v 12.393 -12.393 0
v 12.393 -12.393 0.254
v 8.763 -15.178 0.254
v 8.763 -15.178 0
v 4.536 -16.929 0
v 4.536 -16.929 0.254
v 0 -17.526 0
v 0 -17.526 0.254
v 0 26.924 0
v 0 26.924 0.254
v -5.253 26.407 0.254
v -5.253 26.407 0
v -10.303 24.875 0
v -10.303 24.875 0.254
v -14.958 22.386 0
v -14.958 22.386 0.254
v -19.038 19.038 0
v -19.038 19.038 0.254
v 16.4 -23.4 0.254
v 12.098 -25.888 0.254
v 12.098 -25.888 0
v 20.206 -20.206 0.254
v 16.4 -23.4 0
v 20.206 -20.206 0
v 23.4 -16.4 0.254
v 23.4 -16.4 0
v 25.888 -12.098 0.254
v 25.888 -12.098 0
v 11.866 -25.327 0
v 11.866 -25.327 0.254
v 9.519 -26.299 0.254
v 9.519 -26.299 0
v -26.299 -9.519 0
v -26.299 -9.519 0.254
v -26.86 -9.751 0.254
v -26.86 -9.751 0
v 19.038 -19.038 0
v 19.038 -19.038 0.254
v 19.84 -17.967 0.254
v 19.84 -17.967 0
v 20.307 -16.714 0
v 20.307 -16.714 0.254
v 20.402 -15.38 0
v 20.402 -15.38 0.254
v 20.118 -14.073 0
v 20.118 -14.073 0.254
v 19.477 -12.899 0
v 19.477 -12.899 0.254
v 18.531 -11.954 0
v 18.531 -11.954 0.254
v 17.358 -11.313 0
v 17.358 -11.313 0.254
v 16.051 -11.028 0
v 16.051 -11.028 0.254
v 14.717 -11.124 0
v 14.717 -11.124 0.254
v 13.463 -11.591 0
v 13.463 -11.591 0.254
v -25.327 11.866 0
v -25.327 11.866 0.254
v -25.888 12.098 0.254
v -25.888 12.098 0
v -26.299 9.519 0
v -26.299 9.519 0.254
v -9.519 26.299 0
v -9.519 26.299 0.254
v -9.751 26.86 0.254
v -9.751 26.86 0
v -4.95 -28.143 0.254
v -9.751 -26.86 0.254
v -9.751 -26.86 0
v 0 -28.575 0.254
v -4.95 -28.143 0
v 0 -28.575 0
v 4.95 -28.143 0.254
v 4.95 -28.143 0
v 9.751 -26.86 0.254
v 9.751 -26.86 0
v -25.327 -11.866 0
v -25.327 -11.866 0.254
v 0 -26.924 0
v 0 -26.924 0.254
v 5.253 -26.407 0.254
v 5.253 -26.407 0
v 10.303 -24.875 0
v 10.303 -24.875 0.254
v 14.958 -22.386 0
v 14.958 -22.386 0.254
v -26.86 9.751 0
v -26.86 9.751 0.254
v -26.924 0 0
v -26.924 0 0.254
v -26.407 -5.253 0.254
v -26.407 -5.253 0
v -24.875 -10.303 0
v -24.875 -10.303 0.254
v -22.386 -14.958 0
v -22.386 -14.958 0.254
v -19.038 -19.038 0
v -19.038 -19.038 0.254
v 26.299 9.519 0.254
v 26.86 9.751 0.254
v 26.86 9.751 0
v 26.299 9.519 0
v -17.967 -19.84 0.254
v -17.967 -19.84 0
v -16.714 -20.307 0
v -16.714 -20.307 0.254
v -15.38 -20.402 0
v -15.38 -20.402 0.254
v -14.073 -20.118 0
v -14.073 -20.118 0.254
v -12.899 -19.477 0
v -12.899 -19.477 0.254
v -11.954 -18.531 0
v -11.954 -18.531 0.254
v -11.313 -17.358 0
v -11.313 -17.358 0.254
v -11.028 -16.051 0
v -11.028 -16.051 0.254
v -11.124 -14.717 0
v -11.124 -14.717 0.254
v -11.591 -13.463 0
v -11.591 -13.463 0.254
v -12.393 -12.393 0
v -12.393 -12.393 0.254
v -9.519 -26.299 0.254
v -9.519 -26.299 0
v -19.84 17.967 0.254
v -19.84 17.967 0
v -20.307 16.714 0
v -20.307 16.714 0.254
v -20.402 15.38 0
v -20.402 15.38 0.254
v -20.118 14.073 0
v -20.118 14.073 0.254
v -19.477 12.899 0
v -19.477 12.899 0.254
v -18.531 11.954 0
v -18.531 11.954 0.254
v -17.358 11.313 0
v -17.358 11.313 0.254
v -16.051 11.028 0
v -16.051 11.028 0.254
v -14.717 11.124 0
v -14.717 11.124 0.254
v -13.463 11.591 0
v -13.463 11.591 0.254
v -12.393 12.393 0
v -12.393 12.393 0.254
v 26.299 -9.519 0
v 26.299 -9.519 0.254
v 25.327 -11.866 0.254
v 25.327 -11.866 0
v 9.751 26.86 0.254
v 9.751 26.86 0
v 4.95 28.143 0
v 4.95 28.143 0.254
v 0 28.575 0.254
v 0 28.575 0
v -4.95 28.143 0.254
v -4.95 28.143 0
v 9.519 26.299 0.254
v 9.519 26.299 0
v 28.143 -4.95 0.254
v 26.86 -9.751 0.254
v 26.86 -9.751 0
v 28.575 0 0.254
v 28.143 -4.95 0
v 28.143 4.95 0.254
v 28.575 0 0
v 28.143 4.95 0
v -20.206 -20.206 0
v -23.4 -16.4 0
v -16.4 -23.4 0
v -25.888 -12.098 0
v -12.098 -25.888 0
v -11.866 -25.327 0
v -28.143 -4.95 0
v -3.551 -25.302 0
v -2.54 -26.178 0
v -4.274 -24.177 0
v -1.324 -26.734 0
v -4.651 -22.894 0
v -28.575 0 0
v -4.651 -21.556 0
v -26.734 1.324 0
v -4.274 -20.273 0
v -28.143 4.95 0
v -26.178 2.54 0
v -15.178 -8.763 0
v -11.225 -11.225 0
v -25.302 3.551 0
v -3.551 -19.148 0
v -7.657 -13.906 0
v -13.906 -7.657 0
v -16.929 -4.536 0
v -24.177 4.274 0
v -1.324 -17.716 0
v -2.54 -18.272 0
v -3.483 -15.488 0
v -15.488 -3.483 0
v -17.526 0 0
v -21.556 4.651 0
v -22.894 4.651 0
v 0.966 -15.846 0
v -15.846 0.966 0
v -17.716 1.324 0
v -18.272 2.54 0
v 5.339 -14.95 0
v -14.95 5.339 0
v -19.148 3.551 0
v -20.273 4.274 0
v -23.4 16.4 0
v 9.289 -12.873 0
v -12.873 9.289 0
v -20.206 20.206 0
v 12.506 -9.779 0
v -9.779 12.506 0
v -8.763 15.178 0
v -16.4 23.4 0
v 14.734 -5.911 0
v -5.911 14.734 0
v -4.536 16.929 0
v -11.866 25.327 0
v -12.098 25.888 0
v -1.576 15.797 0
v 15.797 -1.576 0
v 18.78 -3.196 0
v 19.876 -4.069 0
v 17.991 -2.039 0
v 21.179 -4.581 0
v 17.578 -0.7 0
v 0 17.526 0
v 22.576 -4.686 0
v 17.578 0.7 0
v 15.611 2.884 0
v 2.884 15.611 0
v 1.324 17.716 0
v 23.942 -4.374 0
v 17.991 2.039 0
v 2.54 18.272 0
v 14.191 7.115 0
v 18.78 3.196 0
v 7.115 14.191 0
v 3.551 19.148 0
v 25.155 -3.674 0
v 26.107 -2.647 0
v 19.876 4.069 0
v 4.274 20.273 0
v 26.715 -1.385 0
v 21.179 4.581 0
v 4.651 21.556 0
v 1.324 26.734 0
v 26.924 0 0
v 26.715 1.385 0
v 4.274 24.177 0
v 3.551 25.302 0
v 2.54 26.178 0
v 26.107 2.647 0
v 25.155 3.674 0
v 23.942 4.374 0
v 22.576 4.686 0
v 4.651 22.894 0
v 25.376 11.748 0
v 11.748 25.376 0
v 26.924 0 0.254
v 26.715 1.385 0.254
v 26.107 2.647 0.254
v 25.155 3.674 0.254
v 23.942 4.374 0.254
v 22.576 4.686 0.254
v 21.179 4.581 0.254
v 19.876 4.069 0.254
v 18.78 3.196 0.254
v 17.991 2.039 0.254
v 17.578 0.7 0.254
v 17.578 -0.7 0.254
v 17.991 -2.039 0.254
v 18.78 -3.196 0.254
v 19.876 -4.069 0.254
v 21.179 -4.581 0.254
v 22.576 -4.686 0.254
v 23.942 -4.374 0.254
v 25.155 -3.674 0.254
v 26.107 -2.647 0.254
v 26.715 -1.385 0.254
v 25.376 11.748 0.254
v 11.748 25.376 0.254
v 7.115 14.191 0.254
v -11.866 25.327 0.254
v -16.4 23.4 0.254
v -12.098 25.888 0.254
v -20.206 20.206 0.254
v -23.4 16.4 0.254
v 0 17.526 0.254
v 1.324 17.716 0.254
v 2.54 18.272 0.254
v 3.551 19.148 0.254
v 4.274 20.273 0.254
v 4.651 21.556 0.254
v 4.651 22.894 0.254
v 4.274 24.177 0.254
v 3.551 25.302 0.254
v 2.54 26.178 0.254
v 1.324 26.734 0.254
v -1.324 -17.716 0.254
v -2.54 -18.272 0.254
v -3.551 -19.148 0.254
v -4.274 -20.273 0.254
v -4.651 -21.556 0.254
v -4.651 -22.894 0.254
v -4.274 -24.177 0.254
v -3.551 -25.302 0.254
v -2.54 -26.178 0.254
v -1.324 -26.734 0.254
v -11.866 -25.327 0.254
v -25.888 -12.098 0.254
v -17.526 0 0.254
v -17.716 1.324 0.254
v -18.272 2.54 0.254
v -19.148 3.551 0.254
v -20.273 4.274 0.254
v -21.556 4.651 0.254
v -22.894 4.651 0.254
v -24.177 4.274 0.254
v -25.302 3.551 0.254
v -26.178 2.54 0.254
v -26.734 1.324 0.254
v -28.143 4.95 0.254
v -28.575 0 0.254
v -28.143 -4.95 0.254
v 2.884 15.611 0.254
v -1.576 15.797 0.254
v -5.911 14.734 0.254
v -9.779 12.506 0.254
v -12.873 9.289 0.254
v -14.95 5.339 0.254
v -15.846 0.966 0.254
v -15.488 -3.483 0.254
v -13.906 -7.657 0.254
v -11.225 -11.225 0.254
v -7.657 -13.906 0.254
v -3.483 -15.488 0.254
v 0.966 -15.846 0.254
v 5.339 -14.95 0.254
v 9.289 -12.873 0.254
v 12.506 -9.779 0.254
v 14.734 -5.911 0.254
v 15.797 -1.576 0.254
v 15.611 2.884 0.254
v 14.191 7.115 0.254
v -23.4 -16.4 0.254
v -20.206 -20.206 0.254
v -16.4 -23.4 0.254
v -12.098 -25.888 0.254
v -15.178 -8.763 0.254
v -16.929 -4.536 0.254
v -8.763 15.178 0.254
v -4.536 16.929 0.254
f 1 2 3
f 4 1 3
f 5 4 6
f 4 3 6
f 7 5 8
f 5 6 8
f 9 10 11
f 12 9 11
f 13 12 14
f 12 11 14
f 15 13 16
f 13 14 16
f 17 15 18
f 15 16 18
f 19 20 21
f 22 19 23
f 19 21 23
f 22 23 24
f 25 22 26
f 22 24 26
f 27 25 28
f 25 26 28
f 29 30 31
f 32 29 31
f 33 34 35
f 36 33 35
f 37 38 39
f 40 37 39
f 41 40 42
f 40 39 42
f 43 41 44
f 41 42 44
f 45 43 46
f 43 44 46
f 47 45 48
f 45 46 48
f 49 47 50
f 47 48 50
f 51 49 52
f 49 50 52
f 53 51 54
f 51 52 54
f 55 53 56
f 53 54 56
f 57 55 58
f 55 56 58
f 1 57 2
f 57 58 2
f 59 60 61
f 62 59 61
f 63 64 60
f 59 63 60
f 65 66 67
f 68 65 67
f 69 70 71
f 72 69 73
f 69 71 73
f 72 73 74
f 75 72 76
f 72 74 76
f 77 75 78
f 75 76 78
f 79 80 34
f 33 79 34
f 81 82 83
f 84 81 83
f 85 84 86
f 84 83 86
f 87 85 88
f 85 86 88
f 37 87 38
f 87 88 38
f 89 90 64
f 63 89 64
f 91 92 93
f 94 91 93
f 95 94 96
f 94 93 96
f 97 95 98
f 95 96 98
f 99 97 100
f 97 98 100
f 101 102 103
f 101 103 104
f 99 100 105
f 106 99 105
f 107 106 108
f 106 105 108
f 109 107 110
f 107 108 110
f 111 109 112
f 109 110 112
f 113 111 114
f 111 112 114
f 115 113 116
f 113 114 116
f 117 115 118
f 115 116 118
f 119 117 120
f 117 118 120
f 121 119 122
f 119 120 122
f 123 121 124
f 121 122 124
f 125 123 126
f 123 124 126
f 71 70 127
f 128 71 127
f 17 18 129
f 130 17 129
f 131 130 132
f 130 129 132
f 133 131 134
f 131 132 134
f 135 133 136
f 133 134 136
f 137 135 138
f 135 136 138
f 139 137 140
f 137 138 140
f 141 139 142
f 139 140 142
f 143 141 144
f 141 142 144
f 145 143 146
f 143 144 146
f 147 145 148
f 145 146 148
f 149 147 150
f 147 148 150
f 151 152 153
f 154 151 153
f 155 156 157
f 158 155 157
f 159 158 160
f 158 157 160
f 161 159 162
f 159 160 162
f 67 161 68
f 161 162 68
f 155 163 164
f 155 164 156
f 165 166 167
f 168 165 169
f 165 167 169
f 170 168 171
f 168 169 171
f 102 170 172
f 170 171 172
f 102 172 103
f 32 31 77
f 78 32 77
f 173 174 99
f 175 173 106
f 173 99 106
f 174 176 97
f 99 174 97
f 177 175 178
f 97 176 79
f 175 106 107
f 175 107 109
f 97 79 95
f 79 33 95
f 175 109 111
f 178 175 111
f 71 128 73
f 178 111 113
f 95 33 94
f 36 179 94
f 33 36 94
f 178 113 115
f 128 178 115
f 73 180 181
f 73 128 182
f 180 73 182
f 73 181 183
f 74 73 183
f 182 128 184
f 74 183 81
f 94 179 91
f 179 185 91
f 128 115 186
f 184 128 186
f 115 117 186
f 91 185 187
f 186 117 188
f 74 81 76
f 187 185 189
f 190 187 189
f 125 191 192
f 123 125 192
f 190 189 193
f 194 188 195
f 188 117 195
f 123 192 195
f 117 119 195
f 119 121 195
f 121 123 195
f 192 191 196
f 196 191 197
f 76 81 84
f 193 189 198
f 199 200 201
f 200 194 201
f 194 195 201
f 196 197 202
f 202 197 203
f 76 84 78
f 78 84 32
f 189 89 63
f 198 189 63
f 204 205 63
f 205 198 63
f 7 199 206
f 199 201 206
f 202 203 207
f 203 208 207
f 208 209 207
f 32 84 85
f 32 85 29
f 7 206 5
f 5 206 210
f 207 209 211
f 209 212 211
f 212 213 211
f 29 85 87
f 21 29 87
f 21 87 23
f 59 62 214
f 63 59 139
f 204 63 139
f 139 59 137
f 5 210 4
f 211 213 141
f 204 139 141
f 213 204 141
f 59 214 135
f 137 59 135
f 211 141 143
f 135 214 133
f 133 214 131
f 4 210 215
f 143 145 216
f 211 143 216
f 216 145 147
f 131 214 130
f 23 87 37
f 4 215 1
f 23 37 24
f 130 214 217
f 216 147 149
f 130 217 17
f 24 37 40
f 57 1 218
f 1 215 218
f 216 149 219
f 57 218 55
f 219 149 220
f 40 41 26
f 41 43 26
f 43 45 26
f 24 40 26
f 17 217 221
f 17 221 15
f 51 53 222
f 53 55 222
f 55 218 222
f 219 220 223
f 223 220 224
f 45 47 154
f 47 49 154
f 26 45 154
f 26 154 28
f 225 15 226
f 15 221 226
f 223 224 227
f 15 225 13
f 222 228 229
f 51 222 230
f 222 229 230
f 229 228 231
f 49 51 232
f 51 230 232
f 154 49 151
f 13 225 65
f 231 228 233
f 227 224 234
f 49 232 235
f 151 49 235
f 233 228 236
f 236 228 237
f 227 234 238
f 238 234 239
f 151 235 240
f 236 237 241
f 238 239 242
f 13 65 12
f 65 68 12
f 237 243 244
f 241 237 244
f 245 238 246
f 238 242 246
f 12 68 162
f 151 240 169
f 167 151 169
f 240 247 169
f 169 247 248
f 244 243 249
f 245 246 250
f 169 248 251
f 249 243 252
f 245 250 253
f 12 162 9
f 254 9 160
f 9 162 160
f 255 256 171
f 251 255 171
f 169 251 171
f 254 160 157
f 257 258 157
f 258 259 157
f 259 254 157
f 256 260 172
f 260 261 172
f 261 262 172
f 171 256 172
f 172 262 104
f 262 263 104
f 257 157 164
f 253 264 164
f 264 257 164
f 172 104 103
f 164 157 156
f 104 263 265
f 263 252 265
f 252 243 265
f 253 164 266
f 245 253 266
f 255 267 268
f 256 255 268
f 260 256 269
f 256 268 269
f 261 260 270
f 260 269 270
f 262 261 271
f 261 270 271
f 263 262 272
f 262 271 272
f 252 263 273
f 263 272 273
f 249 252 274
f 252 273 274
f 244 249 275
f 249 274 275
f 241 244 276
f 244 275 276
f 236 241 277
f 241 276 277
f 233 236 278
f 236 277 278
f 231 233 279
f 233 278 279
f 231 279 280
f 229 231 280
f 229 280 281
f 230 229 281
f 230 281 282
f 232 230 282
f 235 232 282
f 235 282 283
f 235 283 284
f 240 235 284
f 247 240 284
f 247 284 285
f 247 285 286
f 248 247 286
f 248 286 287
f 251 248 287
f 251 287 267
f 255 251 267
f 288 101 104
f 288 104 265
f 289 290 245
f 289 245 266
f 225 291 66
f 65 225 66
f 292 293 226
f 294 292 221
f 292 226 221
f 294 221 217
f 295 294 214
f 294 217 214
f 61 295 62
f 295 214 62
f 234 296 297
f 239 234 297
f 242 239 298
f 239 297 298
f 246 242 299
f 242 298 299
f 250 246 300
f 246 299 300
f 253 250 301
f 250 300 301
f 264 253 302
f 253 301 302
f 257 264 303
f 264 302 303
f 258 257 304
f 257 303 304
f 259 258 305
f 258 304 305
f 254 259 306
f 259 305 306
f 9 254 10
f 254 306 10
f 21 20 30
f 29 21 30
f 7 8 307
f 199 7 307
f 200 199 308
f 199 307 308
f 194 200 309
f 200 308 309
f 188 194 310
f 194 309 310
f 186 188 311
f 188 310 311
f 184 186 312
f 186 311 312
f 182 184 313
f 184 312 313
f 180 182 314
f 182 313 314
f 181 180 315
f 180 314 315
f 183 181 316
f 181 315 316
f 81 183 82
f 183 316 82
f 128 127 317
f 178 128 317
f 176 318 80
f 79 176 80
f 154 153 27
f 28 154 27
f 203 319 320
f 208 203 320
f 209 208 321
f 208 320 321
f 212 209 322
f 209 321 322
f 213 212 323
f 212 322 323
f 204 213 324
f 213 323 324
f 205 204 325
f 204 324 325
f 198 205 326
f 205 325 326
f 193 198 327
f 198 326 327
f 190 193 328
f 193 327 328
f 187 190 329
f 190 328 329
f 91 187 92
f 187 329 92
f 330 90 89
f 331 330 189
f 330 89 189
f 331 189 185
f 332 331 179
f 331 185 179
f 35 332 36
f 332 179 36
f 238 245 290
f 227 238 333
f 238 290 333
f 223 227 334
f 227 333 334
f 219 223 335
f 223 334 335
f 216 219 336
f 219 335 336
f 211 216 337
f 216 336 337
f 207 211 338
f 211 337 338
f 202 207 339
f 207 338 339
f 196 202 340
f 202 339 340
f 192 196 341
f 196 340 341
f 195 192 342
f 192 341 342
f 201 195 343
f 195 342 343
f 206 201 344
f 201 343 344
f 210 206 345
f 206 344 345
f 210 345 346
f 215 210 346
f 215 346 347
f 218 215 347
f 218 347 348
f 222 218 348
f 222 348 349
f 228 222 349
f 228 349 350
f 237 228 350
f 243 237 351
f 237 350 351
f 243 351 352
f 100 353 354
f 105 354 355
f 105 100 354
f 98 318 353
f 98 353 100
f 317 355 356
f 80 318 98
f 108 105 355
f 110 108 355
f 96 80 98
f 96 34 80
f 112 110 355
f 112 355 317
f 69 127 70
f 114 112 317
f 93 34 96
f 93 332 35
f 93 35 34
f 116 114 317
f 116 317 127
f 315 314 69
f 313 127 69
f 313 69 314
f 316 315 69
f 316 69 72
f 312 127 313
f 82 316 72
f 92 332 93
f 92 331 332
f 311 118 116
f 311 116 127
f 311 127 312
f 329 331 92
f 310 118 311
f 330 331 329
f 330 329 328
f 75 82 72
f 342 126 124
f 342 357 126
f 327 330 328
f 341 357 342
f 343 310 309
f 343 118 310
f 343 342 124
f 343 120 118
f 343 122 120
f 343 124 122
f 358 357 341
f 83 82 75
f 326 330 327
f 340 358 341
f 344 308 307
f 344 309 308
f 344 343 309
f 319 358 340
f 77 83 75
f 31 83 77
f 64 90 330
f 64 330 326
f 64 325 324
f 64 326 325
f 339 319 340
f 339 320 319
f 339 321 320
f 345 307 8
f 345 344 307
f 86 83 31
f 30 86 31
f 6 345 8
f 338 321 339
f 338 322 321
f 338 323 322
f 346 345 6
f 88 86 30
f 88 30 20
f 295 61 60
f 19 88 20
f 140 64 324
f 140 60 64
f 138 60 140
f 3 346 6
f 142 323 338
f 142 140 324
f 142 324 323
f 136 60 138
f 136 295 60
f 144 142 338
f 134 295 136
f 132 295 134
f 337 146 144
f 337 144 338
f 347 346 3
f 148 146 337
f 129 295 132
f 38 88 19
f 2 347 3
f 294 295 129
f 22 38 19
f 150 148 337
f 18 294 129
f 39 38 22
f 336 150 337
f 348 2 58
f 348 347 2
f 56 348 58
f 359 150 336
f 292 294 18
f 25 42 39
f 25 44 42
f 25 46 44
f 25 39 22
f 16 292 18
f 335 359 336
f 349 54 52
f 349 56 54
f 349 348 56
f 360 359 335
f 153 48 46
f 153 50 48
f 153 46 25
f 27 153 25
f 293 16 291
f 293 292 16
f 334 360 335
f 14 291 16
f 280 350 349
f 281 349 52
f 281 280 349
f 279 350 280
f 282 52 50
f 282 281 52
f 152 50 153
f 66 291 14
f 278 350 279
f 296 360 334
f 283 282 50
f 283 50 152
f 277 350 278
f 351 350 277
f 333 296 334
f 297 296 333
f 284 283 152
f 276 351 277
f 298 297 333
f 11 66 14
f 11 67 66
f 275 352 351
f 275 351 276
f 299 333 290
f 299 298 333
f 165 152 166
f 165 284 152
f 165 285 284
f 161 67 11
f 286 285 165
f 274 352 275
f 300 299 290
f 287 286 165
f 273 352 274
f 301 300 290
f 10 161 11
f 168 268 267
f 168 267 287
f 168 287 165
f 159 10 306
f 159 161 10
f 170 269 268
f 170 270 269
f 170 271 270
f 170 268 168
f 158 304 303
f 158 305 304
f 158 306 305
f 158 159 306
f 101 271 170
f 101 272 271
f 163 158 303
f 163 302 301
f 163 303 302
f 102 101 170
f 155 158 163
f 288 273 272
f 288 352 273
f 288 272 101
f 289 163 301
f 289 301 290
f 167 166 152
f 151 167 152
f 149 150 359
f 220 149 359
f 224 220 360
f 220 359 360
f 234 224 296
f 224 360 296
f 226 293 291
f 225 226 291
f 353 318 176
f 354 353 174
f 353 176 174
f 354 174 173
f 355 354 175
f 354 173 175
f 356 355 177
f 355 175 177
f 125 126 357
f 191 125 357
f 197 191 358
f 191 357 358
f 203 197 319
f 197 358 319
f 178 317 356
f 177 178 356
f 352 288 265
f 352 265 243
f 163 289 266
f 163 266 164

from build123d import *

# Parameters (mm, degrees)
SKETCH4_R           = 28.575
BOSS_EXTRUDE2_DEPTH = 0.254
SKETCH5_R           = 15.875
CUT_EXTRUDE5_DEPTH  = 1.254
SKETCH6_R           = 4.699
CUT_EXTRUDE6_DEPTH  = 1.254
CUT_EXTRUDE11_DEPTH = 1.254


with BuildPart() as part:
    # Sketch4 → Boss-Extrude2 (new body)
    with BuildSketch(Plane.XY):
        Circle(SKETCH4_R)
    extrude(amount=BOSS_EXTRUDE2_DEPTH)

    # Sketch5 → Cut-Extrude5 (cut, through all)
    with BuildSketch(Plane.XY.offset(0.254)):
        Circle(SKETCH5_R)
    extrude(amount=-CUT_EXTRUDE5_DEPTH, mode=Mode.SUBTRACT)

    # Sketch6 → Cut-Extrude6 (cut, through all)
    with BuildSketch(Plane.XY.offset(0.254)):
        with Locations((22.225, 0)):
            Circle(SKETCH6_R)
        with BuildLine():
            ThreePointArc((19.03814289, -19.038143063), (19.038142992, -12.392753462), (12.392753391, -12.392753504))
            ThreePointArc((12.392753391, -12.392753504), (6.706909655, -16.191912762), (-3.11e-07, -17.526))
            ThreePointArc((-3.11e-07, -17.526), (-4.699, -22.224999917), (-4.77e-07, -26.924))
            ThreePointArc((-4.77e-07, -26.924), (10.303368456, -24.874532648), (19.03814289, -19.038143063))
        make_face()
        with BuildLine():
            ThreePointArc((-19.038143063, -19.03814289), (-12.392753462, -19.038142992), (-12.392753504, -12.392753391))
            ThreePointArc((-12.392753504, -12.392753391), (-16.191912762, -6.706909655), (-17.526, 3.11e-07))
            ThreePointArc((-17.526, 3.11e-07), (-22.224999917, 4.699), (-26.924, 4.77e-07))
            ThreePointArc((-26.924, 4.77e-07), (-24.874532648, -10.303368456), (-19.038143063, -19.03814289))
        make_face()
        with BuildLine():
            ThreePointArc((-19.03814289, 19.038143063), (-19.038142992, 12.392753462), (-12.392753391, 12.392753504))
            ThreePointArc((-12.392753391, 12.392753504), (-6.706909655, 16.191912762), (3.11e-07, 17.526))
            ThreePointArc((3.11e-07, 17.526), (4.699, 22.224999917), (4.77e-07, 26.924))
            ThreePointArc((4.77e-07, 26.924), (-10.303368456, 24.874532648), (-19.03814289, 19.038143063))
        make_face()
    extrude(amount=-CUT_EXTRUDE6_DEPTH, mode=Mode.SUBTRACT)

    # Sketch8 → Cut-Extrude11 (cut, through all)
    with BuildSketch(Plane.XY.offset(0.254)):
        with BuildLine():
            Line((11.748169406, 25.375786975), (9.518848094, 26.299202097))
            Line((9.518848094, 26.299202097), (9.751046558, 26.859778778))
            ThreePointArc((9.751046558, 26.859778778), (20.205576272, 20.205576272), (26.859778778, 9.751046558))
            Line((26.859778778, 9.751046558), (26.299202097, 9.518848094))
            Line((26.299202097, 9.518848094), (25.375786975, 11.748169406))
            Line((25.375786975, 11.748169406), (14.191115224, 7.115326676))
            ThreePointArc((14.191115224, 7.115326676), (11.225320151, 11.225320151), (7.115326676, 14.191115224))
            Line((7.115326676, 14.191115224), (11.748169406, 25.375786975))
        make_face()
        Polygon((-10.004856053, 27.472529104), (-12.351510066, 26.500513186), (-11.865502107, 25.327186179), (-9.518848094, 26.299202097), align=None)
        Polygon((-26.500513186, 12.351510066), (-27.472529104, 10.004856053), (-26.299202097, 9.518848094), (-25.327186179, 11.865502107), align=None)
        Polygon((-27.472529104, -10.004856053), (-26.500513186, -12.351510066), (-25.327186179, -11.865502107), (-26.299202097, -9.518848094), align=None)
        Polygon((-12.351510066, -26.500513186), (-10.004856053, -27.472529104), (-9.518848094, -26.299202097), (-11.865502107, -25.327186179), align=None)
        Polygon((10.004856053, -27.472529104), (12.351510066, -26.500513186), (11.865502107, -25.327186179), (9.518848094, -26.299202097), align=None)
        Polygon((26.500513186, -12.351510066), (27.472529104, -10.004856053), (26.299202097, -9.518848094), (25.327186179, -11.865502107), align=None)
    extrude(amount=-CUT_EXTRUDE11_DEPTH, mode=Mode.SUBTRACT)


solid = part.part
